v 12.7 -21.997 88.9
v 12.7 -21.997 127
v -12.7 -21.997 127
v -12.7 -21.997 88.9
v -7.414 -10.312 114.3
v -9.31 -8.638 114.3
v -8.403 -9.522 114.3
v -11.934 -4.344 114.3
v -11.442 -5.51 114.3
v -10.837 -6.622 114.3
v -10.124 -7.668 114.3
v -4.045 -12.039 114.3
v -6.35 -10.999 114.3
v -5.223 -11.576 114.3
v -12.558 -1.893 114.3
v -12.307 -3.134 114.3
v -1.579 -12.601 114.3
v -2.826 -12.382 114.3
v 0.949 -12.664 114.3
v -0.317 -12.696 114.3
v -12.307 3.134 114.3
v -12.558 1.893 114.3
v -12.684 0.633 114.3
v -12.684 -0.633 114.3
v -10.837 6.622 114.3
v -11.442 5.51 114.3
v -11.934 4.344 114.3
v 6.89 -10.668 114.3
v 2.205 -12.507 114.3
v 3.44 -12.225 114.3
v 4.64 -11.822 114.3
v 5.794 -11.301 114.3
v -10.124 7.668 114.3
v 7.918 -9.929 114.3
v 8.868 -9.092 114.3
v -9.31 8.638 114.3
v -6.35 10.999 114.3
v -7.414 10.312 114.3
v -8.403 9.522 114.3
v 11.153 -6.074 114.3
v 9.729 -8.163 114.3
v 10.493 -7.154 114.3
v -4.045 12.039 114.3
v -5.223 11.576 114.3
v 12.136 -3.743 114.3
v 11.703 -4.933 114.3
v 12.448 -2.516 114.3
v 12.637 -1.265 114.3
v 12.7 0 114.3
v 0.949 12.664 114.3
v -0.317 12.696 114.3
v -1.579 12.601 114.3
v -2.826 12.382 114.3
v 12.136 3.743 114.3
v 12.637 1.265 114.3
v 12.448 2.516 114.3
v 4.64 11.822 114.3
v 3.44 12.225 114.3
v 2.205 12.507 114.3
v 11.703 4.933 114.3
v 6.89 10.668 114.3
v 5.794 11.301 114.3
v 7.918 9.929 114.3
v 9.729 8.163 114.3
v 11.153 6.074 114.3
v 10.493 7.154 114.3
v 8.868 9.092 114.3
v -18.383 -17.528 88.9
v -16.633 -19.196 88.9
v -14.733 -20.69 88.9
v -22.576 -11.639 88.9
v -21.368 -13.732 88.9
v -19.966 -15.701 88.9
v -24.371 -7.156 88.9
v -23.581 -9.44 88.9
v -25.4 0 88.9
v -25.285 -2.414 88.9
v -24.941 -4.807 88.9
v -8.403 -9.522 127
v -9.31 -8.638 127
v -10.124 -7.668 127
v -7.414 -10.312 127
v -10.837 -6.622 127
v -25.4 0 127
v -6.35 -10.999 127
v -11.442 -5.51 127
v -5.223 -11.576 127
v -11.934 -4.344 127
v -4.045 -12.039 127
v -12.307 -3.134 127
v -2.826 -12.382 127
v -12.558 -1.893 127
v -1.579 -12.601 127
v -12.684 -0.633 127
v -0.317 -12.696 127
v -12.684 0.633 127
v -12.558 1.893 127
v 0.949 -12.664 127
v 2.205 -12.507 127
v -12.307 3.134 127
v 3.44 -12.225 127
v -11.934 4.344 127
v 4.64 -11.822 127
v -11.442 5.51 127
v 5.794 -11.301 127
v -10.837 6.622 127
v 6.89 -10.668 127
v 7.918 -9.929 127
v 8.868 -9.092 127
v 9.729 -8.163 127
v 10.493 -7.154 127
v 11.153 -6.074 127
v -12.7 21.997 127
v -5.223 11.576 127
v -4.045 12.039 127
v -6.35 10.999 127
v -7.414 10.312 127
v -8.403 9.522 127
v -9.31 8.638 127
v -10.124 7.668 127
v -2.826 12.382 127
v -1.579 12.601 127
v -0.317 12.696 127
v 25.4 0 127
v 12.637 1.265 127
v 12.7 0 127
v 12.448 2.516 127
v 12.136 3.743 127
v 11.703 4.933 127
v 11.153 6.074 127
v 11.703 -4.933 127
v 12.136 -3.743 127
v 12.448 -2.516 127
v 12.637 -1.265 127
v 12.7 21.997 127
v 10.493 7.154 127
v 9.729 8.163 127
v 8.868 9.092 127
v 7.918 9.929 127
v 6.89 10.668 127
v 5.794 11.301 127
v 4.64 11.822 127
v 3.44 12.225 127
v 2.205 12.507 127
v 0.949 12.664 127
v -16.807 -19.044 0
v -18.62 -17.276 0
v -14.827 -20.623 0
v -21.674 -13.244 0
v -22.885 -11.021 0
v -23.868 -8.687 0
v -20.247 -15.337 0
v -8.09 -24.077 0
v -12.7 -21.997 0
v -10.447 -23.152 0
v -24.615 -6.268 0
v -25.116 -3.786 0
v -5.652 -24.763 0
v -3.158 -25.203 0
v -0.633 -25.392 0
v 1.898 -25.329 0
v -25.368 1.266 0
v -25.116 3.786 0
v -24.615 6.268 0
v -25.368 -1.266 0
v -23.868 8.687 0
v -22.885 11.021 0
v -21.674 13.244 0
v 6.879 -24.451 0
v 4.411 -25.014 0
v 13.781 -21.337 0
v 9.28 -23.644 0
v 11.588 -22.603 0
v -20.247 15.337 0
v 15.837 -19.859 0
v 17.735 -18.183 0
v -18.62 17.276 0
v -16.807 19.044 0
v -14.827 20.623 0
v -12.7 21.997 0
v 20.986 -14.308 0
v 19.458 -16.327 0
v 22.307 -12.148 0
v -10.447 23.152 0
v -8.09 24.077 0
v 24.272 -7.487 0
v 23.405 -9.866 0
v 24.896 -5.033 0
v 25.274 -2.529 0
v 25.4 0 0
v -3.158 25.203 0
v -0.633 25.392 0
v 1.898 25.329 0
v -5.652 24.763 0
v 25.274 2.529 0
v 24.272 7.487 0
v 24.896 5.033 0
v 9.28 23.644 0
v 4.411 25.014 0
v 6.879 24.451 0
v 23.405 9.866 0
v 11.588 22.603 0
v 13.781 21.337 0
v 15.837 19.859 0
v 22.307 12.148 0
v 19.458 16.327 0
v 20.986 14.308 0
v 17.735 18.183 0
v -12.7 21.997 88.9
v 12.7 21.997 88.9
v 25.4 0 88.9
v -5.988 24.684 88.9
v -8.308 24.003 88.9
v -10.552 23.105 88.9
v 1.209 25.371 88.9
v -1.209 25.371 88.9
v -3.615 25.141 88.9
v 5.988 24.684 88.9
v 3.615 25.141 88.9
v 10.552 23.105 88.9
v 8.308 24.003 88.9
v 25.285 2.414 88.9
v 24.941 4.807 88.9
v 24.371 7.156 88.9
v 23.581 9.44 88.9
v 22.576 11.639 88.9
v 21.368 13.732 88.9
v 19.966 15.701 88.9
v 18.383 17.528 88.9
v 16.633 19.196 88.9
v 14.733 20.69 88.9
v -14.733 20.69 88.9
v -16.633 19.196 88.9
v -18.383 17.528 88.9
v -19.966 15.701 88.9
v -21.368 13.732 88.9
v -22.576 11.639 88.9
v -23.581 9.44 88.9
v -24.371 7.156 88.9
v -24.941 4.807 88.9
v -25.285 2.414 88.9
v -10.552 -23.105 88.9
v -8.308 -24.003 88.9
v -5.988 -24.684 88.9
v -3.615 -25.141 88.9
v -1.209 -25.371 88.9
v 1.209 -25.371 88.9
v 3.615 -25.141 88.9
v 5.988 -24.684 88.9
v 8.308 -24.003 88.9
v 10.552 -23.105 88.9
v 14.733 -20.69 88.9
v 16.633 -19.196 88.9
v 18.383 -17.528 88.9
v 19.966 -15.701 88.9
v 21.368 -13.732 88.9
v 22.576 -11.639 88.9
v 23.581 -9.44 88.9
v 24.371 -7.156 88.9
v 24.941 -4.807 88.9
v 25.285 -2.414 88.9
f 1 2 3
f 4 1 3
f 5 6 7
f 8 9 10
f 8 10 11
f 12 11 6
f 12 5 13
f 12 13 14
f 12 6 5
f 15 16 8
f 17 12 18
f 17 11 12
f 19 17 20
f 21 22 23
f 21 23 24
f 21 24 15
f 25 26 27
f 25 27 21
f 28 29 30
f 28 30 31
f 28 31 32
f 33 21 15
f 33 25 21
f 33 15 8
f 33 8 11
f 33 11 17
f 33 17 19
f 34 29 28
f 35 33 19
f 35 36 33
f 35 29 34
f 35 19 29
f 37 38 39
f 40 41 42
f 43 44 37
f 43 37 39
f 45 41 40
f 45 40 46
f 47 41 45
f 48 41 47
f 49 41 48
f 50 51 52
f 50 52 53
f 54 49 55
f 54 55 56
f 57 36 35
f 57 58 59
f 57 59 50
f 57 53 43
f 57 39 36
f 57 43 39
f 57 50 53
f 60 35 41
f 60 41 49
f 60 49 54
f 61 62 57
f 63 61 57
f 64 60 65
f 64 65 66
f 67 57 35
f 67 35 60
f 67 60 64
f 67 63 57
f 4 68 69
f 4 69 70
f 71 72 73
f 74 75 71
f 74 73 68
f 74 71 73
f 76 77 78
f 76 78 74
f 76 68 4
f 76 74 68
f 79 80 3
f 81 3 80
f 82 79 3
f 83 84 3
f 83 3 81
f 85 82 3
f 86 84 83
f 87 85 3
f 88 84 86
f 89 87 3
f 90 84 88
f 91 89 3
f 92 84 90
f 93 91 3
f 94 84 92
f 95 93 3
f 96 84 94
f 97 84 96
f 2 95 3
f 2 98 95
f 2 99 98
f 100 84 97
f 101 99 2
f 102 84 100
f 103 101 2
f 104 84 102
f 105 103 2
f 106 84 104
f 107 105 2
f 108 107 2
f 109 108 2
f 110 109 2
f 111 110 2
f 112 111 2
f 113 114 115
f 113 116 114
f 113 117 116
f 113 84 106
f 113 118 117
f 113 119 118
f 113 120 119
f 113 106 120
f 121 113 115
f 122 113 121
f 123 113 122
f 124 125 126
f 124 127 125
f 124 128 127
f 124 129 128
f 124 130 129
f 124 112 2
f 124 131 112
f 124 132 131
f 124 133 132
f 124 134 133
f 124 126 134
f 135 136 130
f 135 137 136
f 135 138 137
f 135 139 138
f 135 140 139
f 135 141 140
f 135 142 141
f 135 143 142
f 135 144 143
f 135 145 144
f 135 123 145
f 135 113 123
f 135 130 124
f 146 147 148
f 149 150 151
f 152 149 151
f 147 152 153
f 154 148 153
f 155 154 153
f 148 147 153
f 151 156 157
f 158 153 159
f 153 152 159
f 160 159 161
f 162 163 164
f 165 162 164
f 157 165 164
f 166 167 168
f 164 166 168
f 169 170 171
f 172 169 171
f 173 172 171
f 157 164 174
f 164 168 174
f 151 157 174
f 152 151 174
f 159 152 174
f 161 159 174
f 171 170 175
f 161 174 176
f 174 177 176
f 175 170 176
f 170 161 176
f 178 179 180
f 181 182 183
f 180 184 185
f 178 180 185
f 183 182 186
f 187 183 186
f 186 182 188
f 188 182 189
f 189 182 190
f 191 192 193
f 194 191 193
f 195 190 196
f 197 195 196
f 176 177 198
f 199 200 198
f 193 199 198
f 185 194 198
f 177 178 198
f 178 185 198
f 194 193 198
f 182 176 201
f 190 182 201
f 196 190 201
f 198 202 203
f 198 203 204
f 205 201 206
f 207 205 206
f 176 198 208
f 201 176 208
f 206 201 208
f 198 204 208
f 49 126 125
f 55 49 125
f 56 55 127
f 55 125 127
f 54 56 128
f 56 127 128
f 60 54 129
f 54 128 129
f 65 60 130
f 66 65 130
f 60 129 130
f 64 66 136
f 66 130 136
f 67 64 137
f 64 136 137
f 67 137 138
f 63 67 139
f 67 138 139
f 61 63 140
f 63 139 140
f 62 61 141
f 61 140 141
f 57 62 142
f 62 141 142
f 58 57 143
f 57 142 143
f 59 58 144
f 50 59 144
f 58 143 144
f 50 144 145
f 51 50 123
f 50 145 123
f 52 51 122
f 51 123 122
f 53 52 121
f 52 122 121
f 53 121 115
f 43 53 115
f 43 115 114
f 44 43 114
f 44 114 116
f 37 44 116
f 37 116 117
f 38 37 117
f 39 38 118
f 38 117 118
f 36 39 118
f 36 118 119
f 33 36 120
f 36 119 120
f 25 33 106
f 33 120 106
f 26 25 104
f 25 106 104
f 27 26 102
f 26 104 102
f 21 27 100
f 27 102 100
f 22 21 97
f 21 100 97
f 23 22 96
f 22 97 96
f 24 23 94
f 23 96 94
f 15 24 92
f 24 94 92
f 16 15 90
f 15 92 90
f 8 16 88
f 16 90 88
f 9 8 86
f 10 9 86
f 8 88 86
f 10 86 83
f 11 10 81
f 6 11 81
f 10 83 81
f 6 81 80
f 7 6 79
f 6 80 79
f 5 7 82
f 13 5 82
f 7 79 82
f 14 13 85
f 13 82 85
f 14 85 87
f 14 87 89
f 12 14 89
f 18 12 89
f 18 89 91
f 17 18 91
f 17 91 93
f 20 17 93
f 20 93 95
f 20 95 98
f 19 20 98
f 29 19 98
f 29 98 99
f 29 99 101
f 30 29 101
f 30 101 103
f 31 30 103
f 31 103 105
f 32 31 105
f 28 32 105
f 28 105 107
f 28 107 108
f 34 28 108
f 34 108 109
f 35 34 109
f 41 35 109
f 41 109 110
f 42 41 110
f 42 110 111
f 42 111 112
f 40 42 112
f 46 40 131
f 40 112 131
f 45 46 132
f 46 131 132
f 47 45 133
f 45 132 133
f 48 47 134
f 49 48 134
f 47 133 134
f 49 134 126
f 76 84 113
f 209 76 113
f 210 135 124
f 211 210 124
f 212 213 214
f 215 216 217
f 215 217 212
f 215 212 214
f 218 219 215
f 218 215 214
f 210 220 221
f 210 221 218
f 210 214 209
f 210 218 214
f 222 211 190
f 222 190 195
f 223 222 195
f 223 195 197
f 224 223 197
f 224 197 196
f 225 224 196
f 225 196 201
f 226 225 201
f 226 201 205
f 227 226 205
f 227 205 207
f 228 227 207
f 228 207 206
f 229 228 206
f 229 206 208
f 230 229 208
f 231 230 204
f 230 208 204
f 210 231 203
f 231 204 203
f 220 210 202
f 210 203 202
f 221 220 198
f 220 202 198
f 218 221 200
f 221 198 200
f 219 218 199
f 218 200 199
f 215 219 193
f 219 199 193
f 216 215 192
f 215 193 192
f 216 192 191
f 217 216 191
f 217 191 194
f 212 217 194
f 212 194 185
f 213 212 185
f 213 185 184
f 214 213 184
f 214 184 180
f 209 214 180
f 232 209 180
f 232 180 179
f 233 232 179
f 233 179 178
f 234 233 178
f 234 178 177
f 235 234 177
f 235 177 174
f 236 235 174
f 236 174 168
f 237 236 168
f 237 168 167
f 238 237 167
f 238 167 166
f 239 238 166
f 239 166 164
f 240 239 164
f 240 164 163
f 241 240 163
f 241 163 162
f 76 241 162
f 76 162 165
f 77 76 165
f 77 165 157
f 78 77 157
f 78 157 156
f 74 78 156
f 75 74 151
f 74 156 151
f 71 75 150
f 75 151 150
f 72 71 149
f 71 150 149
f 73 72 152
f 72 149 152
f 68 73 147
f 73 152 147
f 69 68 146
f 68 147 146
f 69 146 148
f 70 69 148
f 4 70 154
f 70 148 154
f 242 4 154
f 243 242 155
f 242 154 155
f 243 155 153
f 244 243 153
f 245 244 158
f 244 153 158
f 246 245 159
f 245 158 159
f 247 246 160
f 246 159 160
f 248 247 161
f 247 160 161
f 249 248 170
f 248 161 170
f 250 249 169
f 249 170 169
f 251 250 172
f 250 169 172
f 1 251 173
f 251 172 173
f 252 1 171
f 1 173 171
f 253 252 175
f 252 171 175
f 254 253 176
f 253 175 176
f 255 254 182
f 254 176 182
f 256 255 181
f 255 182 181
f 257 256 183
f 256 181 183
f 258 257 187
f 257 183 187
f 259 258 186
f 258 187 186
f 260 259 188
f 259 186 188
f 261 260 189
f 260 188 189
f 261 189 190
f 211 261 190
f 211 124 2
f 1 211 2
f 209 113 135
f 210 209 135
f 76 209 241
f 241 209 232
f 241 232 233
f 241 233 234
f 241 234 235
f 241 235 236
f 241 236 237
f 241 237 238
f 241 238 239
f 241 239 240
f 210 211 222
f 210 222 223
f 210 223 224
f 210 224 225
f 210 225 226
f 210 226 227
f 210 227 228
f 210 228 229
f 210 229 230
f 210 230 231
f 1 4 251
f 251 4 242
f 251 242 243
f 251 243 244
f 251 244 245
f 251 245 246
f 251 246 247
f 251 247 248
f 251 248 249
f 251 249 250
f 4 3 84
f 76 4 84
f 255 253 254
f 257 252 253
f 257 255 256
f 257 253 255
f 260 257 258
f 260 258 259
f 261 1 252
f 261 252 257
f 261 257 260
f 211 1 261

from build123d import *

# Parameters (mm, degrees)
F0_R     = 25.4
F1_DEPTH = 127
F3_DEPTH = 38.1
F4_R     = 12.7
F5_DEPTH = 12.7


with BuildPart() as f1:
    # F0 (on Top) → F1 (new body)
    with BuildSketch(Plane.XY):
        Circle(F0_R)
    extrude(amount=F1_DEPTH)

    # F2 (on face) → F3 (cut)
    with BuildSketch(Plane.XY.offset(127)):
        with BuildLine():
            ThreePointArc((-25.4, 0), (-21.997045, -12.7), (-12.7, -21.997045))
            Line((-12.7, -21.997045), (-25.4, 0))
        make_face()
        with BuildLine():
            ThreePointArc((-12.7, -21.997045), (0, -25.4), (12.7, -21.997045))
            Line((12.7, -21.997045), (-12.7, -21.997045))
        make_face()
        with BuildLine():
            ThreePointArc((12.7, -21.997045), (21.997045, -12.7), (25.4, 0))
            Line((25.4, 0), (12.7, -21.997045))
        make_face()
        with BuildLine():
            Line((12.7, 21.997045), (25.4, 0))
            ThreePointArc((25.4, 0), (21.997045, 12.7), (12.7, 21.997045))
        make_face()
        with BuildLine():
            Line((-12.7, 21.997045), (12.7, 21.997045))
            ThreePointArc((12.7, 21.997045), (0, 25.4), (-12.7, 21.997045))
        make_face()
        with BuildLine():
            Line((-25.4, 0), (-12.7, 21.997045))
            ThreePointArc((-12.7, 21.997045), (-21.997045, 12.7), (-25.4, 0))
        make_face()
    extrude(amount=-F3_DEPTH, mode=Mode.SUBTRACT)

    # F4 (on face) → F5 (cut, symmetric)
    with BuildSketch(Plane.XY.offset(127)):
        Circle(F4_R)
    extrude(amount=F5_DEPTH, both=True, mode=Mode.SUBTRACT)


solid = f1.part
